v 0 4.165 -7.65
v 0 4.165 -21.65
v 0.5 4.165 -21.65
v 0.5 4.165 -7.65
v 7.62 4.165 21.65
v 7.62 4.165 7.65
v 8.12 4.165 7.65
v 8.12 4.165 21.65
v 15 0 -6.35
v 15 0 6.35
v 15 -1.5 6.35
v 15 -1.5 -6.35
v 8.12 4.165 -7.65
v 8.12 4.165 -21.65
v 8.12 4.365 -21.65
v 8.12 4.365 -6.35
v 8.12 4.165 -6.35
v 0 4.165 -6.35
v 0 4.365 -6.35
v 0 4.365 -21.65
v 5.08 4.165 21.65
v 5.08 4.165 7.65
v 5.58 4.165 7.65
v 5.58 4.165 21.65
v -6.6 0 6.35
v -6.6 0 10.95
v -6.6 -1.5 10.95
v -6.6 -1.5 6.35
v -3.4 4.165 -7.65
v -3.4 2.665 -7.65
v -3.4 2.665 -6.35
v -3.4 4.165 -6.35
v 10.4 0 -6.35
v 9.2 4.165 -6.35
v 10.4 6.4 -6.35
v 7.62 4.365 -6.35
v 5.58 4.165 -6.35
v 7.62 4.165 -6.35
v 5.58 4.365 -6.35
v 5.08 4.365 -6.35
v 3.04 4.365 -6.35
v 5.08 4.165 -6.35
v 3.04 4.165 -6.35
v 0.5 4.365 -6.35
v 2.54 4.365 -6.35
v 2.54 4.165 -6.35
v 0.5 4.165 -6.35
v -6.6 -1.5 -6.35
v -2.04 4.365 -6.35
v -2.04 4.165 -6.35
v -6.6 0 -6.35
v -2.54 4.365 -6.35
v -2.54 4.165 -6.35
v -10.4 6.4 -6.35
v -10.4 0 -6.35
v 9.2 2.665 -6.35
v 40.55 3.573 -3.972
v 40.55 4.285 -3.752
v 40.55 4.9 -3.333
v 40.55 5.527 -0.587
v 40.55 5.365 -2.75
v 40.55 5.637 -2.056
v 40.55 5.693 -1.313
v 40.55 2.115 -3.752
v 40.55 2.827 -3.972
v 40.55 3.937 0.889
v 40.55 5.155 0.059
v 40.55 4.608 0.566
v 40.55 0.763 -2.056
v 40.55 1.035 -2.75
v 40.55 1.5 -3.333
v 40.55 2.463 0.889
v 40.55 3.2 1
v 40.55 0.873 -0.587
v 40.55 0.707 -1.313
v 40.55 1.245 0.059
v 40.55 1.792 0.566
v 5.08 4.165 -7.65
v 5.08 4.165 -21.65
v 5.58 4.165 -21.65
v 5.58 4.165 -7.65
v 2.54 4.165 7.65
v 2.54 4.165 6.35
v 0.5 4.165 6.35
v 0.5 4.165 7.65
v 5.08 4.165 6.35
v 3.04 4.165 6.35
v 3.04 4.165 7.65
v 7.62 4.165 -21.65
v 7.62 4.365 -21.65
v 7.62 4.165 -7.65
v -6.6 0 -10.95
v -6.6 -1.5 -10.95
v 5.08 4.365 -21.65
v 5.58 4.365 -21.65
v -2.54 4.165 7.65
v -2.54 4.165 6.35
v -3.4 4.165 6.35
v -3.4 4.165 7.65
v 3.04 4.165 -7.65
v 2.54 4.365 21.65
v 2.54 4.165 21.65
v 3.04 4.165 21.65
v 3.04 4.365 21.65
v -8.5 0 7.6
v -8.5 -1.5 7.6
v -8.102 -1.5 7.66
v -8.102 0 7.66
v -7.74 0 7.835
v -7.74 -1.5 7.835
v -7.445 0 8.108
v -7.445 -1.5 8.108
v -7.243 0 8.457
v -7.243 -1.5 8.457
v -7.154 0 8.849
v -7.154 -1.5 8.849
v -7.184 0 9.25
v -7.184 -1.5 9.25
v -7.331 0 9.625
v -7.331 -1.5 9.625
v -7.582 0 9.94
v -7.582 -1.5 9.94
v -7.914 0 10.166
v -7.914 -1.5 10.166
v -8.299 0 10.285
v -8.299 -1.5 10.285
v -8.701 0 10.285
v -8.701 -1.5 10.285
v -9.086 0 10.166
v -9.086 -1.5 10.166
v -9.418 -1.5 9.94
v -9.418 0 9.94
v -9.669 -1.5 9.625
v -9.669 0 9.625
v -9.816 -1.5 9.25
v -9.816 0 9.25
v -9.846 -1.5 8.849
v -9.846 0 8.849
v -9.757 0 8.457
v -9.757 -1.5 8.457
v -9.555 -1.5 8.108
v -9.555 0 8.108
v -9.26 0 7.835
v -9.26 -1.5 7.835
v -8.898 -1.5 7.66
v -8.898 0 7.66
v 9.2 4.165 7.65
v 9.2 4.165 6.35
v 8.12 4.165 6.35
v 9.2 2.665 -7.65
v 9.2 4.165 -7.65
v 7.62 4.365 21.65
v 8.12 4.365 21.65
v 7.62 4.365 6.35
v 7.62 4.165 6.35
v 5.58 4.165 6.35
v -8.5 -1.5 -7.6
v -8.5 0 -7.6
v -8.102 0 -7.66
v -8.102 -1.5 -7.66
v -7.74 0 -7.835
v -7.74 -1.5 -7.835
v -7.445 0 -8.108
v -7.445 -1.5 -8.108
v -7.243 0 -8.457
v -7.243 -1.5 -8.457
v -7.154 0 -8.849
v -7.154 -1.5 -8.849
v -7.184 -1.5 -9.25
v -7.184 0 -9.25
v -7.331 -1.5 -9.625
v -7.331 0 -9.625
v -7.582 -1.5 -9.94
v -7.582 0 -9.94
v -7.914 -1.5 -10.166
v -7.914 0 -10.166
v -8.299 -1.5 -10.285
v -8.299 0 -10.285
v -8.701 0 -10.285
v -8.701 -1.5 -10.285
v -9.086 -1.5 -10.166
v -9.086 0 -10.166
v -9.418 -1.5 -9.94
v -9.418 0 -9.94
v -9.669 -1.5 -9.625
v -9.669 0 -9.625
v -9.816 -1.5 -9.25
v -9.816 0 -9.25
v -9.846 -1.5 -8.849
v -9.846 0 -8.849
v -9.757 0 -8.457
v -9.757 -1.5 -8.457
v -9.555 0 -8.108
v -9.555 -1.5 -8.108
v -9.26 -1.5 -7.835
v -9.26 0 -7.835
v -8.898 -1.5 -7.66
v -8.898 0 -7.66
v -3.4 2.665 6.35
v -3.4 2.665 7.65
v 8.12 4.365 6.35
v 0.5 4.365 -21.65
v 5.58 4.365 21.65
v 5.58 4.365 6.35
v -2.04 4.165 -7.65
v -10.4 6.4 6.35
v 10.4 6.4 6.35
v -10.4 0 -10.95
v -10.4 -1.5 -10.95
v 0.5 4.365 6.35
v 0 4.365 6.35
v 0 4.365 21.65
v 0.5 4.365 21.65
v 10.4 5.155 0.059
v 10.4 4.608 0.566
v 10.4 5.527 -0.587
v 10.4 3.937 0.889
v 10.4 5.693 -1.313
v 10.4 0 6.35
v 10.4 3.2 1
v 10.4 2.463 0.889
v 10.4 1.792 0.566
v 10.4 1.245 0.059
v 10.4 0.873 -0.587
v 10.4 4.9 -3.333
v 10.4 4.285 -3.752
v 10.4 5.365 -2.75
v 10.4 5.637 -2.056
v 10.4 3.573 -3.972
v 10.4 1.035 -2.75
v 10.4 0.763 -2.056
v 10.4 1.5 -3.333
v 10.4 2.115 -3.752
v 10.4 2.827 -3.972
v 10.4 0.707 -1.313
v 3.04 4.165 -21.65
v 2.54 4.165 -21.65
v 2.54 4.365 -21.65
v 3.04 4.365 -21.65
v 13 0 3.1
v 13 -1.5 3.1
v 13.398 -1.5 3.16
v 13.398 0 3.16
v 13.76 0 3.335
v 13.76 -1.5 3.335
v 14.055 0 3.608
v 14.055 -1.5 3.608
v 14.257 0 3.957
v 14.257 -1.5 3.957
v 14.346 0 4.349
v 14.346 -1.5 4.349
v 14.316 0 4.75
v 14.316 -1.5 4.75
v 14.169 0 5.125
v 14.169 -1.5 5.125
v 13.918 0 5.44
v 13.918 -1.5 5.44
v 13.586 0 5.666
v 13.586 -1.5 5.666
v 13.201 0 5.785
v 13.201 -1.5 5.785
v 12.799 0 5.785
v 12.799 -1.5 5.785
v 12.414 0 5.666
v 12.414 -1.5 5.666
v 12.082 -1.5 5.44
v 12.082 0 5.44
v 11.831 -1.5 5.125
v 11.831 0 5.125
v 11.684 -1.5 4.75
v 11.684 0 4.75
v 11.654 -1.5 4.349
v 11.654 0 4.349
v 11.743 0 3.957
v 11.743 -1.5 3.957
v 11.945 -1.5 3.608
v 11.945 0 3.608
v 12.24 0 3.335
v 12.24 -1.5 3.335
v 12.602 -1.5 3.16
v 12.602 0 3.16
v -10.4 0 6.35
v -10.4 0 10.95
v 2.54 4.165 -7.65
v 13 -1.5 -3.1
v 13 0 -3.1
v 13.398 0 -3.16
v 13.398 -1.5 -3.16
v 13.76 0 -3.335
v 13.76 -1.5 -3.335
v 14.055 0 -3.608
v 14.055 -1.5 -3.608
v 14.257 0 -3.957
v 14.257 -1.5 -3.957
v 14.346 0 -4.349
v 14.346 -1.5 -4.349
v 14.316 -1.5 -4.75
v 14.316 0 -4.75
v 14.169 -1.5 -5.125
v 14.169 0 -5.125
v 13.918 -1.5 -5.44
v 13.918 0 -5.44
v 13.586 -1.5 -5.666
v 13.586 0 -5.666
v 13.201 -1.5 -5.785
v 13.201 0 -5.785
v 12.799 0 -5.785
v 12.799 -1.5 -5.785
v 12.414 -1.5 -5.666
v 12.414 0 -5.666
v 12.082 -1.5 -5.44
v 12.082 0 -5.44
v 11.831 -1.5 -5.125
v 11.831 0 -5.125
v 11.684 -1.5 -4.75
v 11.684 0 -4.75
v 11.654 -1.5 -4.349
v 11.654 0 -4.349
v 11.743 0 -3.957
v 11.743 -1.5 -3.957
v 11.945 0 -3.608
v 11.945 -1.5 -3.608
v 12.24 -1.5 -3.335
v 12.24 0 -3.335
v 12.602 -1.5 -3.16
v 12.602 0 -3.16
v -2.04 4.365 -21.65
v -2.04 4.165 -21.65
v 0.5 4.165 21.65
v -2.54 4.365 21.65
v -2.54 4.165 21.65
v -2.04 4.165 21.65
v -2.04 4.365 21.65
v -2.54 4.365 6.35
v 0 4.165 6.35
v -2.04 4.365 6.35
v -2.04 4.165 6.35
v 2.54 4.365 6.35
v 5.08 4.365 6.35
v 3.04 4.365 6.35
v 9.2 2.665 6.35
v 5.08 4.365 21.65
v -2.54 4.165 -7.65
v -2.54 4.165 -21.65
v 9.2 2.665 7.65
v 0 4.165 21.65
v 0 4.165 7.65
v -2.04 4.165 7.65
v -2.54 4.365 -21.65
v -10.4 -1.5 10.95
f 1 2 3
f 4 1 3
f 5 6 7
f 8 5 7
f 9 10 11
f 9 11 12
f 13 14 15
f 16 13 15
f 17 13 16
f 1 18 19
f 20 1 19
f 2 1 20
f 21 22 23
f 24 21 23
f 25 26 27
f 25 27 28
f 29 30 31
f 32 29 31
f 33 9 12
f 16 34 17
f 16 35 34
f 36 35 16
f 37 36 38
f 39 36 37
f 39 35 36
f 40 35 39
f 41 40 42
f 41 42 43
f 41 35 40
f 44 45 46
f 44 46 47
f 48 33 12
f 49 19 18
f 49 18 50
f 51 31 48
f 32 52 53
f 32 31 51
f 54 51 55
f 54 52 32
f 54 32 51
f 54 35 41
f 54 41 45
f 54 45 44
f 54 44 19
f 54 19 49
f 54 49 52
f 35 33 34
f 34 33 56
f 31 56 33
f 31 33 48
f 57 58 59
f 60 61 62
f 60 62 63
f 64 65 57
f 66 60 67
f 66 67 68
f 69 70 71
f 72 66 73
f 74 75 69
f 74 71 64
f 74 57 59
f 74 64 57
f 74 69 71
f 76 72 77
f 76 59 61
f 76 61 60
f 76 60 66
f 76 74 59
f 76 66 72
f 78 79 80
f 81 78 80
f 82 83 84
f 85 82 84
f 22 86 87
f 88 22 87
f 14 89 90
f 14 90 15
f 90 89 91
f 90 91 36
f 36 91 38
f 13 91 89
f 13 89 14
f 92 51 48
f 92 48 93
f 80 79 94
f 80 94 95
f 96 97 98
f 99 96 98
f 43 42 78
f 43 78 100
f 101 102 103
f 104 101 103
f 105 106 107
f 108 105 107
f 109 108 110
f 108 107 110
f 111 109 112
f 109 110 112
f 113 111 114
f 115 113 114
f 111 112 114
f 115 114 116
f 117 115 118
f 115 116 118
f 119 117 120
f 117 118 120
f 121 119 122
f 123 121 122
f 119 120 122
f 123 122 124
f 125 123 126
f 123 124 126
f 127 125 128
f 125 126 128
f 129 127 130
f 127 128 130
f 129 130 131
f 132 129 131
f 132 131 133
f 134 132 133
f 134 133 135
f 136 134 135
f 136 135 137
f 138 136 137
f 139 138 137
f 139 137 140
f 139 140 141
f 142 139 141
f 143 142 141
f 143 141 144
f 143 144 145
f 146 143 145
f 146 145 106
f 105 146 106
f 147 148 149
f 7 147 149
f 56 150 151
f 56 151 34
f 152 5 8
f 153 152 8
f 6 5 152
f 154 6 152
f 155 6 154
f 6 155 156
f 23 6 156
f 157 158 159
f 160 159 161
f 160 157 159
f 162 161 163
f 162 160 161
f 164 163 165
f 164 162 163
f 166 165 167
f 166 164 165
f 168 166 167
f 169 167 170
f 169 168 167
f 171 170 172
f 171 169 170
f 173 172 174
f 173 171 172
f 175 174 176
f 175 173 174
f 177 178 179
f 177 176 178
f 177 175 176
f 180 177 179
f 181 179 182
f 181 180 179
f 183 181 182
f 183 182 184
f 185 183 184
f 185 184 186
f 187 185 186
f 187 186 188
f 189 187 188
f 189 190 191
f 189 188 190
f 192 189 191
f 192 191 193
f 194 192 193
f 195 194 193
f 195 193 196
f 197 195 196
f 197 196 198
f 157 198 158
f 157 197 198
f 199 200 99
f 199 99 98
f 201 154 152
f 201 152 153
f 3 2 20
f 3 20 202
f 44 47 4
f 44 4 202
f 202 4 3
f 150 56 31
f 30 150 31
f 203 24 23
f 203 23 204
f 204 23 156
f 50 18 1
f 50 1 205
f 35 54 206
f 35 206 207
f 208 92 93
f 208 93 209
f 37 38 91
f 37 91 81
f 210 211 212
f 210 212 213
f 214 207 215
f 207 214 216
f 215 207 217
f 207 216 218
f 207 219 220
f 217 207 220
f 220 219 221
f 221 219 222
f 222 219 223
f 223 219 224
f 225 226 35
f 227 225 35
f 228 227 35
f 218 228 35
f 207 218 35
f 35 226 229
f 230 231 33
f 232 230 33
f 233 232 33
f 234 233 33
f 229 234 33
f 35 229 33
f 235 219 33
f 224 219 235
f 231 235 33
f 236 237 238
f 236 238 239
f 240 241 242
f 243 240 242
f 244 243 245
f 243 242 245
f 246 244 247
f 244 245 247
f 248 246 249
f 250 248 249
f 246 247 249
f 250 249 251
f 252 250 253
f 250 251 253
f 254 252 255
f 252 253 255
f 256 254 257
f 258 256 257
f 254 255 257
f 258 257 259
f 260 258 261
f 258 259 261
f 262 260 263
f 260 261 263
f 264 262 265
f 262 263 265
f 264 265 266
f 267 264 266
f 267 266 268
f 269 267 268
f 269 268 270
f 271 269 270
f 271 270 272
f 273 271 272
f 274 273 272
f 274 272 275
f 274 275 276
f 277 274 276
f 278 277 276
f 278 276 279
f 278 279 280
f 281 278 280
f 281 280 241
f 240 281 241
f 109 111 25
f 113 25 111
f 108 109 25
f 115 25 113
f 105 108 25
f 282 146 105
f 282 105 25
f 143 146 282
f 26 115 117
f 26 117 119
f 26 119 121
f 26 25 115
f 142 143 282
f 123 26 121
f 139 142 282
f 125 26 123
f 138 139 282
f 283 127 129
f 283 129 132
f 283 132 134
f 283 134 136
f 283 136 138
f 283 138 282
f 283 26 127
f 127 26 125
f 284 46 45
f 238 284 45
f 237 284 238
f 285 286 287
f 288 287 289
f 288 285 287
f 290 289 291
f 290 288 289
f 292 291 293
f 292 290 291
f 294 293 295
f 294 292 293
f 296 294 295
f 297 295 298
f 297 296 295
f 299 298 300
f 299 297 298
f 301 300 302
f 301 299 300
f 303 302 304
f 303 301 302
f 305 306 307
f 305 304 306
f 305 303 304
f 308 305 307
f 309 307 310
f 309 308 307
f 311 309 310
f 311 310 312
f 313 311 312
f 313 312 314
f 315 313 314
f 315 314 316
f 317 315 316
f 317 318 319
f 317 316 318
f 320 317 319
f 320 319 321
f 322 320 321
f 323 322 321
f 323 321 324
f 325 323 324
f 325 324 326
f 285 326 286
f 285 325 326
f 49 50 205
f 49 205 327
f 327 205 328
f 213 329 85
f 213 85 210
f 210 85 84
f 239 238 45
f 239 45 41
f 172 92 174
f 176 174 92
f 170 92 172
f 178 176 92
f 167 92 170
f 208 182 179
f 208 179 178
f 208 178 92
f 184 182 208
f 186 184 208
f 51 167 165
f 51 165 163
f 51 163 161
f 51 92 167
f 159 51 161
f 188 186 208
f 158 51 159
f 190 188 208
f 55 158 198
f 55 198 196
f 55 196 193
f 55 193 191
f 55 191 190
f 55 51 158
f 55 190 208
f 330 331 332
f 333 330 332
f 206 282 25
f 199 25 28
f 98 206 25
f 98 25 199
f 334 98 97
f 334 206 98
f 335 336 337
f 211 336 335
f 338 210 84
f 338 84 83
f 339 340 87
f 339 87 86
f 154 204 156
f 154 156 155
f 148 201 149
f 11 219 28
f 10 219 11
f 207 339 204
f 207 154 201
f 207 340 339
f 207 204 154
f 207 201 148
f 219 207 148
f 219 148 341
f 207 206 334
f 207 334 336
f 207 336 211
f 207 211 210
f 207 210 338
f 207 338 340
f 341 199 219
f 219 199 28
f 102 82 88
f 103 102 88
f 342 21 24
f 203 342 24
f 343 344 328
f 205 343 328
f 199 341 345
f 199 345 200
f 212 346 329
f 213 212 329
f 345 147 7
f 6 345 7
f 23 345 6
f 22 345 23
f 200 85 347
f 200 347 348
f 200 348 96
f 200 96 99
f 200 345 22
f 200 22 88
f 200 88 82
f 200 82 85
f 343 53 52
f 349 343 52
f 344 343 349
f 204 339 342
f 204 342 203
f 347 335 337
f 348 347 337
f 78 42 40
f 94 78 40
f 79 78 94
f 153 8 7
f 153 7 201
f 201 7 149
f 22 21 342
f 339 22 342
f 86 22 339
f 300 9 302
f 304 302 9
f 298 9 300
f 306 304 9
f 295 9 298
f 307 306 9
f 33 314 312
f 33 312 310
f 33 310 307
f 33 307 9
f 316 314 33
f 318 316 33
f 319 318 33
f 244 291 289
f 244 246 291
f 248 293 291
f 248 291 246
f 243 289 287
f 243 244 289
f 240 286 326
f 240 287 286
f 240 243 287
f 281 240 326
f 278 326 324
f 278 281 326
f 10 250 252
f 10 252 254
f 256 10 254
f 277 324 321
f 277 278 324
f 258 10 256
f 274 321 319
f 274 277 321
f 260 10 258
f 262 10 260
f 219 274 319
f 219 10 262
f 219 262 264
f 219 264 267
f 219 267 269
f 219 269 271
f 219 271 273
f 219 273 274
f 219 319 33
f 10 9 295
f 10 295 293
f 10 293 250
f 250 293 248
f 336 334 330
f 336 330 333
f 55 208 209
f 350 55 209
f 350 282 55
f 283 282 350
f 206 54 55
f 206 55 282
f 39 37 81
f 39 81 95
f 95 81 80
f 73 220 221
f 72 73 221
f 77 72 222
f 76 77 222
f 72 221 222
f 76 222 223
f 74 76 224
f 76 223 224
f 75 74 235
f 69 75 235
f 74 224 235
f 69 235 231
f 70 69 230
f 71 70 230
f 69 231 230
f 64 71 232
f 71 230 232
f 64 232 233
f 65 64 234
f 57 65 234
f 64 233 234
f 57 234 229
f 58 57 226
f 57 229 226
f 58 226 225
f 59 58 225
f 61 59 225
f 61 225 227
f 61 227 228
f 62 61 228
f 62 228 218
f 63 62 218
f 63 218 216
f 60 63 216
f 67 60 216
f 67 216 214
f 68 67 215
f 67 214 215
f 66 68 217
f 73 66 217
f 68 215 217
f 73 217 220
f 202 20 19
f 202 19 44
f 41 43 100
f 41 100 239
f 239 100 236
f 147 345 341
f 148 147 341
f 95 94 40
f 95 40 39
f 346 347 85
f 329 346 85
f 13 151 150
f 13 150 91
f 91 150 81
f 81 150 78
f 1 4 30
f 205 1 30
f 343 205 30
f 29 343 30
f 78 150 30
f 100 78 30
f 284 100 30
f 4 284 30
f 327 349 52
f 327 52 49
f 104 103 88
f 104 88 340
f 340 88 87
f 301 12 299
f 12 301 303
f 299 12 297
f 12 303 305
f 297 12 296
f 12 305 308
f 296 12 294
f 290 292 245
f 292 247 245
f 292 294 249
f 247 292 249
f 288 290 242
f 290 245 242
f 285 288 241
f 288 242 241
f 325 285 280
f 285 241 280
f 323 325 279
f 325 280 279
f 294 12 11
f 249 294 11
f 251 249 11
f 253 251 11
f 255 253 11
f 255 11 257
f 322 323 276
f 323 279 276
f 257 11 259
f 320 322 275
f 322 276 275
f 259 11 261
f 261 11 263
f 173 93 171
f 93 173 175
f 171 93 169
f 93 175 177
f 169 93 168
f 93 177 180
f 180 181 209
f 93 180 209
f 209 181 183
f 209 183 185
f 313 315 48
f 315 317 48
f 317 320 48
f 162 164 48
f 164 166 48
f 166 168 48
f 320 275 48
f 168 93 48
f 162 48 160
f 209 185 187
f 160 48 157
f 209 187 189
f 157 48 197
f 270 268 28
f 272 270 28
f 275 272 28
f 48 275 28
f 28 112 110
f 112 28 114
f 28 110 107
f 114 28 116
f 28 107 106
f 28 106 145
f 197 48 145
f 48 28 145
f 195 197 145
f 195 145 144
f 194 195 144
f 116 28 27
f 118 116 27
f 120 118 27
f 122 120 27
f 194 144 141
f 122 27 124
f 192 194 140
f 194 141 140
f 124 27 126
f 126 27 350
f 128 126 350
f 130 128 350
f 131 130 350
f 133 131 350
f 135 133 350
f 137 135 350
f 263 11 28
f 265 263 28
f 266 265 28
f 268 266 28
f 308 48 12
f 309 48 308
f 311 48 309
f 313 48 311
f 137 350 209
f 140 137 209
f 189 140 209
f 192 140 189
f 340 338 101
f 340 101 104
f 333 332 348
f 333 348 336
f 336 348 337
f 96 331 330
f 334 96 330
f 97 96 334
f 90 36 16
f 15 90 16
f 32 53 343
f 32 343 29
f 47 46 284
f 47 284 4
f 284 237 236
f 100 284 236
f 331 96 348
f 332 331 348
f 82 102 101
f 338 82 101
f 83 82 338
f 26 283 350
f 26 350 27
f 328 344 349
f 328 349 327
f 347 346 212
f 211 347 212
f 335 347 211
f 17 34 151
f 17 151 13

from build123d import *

# Parameters (mm, degrees)
SKETCH1_W               = 20.8
SKETCH1_H               = 12.7
BOSS_EXTRUDE1_DEPTH     = 6.4
BOSS_EXTRUDE2_DEPTH     = 1.5
SKETCH5_R               = 1.35
CUT_EXTRUDE1_DEPTH      = 21.181984541
SKETCH8_R               = 2.5
BOSS_EXTRUDE3_DEPTH     = 30.15
SKETCH9_W               = 12.6
SKETCH9_H               = 1.3
BOSS_EXTRUDE4_DEPTH     = 1.5
SKETCH10_W              = 0.5
SKETCH10_H              = 15.3
BOSS_EXTRUDE5_DEPTH     = 0.2
LPATTERN1_COUNT         = 5
LPATTERN1_PITCH         = 2.54
MIRROR2_COPY_1_SKETCH_W = 0.5
MIRROR2_COPY_1_SKETCH_H = 15.3
MIRROR2_COPY_1_DEPTH    = 0.2
MIRROR2_COPY_2_SKETCH_W = 0.5
MIRROR2_COPY_2_SKETCH_H = 15.3
MIRROR2_COPY_2_DEPTH    = 0.2
MIRROR2_COPY_3_SKETCH_W = 0.5
MIRROR2_COPY_3_SKETCH_H = 15.3
MIRROR2_COPY_3_DEPTH    = 0.2
MIRROR2_COPY_4_SKETCH_W = 0.5
MIRROR2_COPY_4_SKETCH_H = 15.3
MIRROR2_COPY_4_DEPTH    = 0.2


with BuildPart() as part:
    # Sketch1 → Boss-Extrude1 (new body)
    with BuildSketch(Plane(origin=(0, 0, 0), x_dir=(1, 0, 0), z_dir=(0, 1, 0))):
        Rectangle(SKETCH1_W, SKETCH1_H)
    extrude(amount=BOSS_EXTRUDE1_DEPTH)

    # Sketch3 → Boss-Extrude2 (add)
    with BuildSketch(Plane.XZ):
        Polygon((-10.4, 10.95), (-6.6, 10.95), (-6.6, 6.35), (15, 6.35), (15, -6.35), (-6.6, -6.35), (-6.6, -10.95), (-10.4, -10.95), align=None)
    extrude(amount=BOSS_EXTRUDE2_DEPTH)

    # Sketch5 → Cut-Extrude1 (cut, through all)
    with BuildSketch(Plane.XZ.offset(1.5)):
        with Locations(Location((-8.5, 8.95, 0), (0, 0, 270))):
            Circle(SKETCH5_R)
        with Locations(Location((13, 4.45, 0), (0, 0, 270))):
            Circle(SKETCH5_R)
    cut_extrude1 = extrude(amount=-CUT_EXTRUDE1_DEPTH, mode=Mode.SUBTRACT)

    # Mirror3: Cut-Extrude1 across plane
    add(cut_extrude1.mirror(Plane.XY), mode=Mode.SUBTRACT)

    # Sketch8 → Boss-Extrude3 (add)
    with BuildSketch(Plane(origin=(10.4, 0, 0), x_dir=(0, 0, -1), z_dir=(1, 0, 0))):
        with Locations(Location((1.5, 3.2, 0), (0, 0, 180))):
            Circle(SKETCH8_R)
    extrude(amount=BOSS_EXTRUDE3_DEPTH)

    # Sketch9 → Boss-Extrude4 (add)
    with BuildSketch(Plane(origin=(0, 2.665, 0), x_dir=(-1, 0, 0), z_dir=(0, -1, 0))):
        with Locations((-2.9, -7)):
            Rectangle(SKETCH9_W, SKETCH9_H)
    boss_extrude4 = extrude(amount=-BOSS_EXTRUDE4_DEPTH)

    # Sketch10 → Boss-Extrude5 (add)
    with BuildSketch(Plane(origin=(0, 4.165, 0), x_dir=(1, 0, 0), z_dir=(0, 1, 0))):
        with Locations((7.87, -14)):
            Rectangle(SKETCH10_W, SKETCH10_H)
    boss_extrude5 = extrude(amount=BOSS_EXTRUDE5_DEPTH)

    # LPattern1: Boss-Extrude5 ×5
    with Locations(*[(-i * LPATTERN1_PITCH, 0, 0) for i in range(1, LPATTERN1_COUNT)]):
        add(boss_extrude5)

    # Mirror2: Boss-Extrude4, Boss-Extrude5 across plane
    add(boss_extrude4.mirror(Plane.XY))
    add(boss_extrude5.mirror(Plane.XY))

    # Mirror2 copy 1 sketch → Mirror2 copy 1 (add)
    with BuildSketch(Plane(origin=(-2.54, 4.165, 0), x_dir=(1, 0, 0), z_dir=(0, 1, 0))):
        with Locations((7.87, 14)):
            Rectangle(MIRROR2_COPY_1_SKETCH_W, MIRROR2_COPY_1_SKETCH_H)
    extrude(amount=MIRROR2_COPY_1_DEPTH)

    # Mirror2 copy 2 sketch → Mirror2 copy 2 (add)
    with BuildSketch(Plane(origin=(-5.08, 4.165, 0), x_dir=(1, 0, 0), z_dir=(0, 1, 0))):
        with Locations((7.87, 14)):
            Rectangle(MIRROR2_COPY_2_SKETCH_W, MIRROR2_COPY_2_SKETCH_H)
    extrude(amount=MIRROR2_COPY_2_DEPTH)

    # Mirror2 copy 3 sketch → Mirror2 copy 3 (add)
    with BuildSketch(Plane(origin=(-7.62, 4.165, 0), x_dir=(1, 0, 0), z_dir=(0, 1, 0))):
        with Locations((7.87, 14)):
            Rectangle(MIRROR2_COPY_3_SKETCH_W, MIRROR2_COPY_3_SKETCH_H)
    extrude(amount=MIRROR2_COPY_3_DEPTH)

    # Mirror2 copy 4 sketch → Mirror2 copy 4 (add)
    with BuildSketch(Plane(origin=(-10.16, 4.165, 0), x_dir=(1, 0, 0), z_dir=(0, 1, 0))):
        with Locations((7.87, 14)):
            Rectangle(MIRROR2_COPY_4_SKETCH_W, MIRROR2_COPY_4_SKETCH_H)
    extrude(amount=MIRROR2_COPY_4_DEPTH)


solid = part.part
